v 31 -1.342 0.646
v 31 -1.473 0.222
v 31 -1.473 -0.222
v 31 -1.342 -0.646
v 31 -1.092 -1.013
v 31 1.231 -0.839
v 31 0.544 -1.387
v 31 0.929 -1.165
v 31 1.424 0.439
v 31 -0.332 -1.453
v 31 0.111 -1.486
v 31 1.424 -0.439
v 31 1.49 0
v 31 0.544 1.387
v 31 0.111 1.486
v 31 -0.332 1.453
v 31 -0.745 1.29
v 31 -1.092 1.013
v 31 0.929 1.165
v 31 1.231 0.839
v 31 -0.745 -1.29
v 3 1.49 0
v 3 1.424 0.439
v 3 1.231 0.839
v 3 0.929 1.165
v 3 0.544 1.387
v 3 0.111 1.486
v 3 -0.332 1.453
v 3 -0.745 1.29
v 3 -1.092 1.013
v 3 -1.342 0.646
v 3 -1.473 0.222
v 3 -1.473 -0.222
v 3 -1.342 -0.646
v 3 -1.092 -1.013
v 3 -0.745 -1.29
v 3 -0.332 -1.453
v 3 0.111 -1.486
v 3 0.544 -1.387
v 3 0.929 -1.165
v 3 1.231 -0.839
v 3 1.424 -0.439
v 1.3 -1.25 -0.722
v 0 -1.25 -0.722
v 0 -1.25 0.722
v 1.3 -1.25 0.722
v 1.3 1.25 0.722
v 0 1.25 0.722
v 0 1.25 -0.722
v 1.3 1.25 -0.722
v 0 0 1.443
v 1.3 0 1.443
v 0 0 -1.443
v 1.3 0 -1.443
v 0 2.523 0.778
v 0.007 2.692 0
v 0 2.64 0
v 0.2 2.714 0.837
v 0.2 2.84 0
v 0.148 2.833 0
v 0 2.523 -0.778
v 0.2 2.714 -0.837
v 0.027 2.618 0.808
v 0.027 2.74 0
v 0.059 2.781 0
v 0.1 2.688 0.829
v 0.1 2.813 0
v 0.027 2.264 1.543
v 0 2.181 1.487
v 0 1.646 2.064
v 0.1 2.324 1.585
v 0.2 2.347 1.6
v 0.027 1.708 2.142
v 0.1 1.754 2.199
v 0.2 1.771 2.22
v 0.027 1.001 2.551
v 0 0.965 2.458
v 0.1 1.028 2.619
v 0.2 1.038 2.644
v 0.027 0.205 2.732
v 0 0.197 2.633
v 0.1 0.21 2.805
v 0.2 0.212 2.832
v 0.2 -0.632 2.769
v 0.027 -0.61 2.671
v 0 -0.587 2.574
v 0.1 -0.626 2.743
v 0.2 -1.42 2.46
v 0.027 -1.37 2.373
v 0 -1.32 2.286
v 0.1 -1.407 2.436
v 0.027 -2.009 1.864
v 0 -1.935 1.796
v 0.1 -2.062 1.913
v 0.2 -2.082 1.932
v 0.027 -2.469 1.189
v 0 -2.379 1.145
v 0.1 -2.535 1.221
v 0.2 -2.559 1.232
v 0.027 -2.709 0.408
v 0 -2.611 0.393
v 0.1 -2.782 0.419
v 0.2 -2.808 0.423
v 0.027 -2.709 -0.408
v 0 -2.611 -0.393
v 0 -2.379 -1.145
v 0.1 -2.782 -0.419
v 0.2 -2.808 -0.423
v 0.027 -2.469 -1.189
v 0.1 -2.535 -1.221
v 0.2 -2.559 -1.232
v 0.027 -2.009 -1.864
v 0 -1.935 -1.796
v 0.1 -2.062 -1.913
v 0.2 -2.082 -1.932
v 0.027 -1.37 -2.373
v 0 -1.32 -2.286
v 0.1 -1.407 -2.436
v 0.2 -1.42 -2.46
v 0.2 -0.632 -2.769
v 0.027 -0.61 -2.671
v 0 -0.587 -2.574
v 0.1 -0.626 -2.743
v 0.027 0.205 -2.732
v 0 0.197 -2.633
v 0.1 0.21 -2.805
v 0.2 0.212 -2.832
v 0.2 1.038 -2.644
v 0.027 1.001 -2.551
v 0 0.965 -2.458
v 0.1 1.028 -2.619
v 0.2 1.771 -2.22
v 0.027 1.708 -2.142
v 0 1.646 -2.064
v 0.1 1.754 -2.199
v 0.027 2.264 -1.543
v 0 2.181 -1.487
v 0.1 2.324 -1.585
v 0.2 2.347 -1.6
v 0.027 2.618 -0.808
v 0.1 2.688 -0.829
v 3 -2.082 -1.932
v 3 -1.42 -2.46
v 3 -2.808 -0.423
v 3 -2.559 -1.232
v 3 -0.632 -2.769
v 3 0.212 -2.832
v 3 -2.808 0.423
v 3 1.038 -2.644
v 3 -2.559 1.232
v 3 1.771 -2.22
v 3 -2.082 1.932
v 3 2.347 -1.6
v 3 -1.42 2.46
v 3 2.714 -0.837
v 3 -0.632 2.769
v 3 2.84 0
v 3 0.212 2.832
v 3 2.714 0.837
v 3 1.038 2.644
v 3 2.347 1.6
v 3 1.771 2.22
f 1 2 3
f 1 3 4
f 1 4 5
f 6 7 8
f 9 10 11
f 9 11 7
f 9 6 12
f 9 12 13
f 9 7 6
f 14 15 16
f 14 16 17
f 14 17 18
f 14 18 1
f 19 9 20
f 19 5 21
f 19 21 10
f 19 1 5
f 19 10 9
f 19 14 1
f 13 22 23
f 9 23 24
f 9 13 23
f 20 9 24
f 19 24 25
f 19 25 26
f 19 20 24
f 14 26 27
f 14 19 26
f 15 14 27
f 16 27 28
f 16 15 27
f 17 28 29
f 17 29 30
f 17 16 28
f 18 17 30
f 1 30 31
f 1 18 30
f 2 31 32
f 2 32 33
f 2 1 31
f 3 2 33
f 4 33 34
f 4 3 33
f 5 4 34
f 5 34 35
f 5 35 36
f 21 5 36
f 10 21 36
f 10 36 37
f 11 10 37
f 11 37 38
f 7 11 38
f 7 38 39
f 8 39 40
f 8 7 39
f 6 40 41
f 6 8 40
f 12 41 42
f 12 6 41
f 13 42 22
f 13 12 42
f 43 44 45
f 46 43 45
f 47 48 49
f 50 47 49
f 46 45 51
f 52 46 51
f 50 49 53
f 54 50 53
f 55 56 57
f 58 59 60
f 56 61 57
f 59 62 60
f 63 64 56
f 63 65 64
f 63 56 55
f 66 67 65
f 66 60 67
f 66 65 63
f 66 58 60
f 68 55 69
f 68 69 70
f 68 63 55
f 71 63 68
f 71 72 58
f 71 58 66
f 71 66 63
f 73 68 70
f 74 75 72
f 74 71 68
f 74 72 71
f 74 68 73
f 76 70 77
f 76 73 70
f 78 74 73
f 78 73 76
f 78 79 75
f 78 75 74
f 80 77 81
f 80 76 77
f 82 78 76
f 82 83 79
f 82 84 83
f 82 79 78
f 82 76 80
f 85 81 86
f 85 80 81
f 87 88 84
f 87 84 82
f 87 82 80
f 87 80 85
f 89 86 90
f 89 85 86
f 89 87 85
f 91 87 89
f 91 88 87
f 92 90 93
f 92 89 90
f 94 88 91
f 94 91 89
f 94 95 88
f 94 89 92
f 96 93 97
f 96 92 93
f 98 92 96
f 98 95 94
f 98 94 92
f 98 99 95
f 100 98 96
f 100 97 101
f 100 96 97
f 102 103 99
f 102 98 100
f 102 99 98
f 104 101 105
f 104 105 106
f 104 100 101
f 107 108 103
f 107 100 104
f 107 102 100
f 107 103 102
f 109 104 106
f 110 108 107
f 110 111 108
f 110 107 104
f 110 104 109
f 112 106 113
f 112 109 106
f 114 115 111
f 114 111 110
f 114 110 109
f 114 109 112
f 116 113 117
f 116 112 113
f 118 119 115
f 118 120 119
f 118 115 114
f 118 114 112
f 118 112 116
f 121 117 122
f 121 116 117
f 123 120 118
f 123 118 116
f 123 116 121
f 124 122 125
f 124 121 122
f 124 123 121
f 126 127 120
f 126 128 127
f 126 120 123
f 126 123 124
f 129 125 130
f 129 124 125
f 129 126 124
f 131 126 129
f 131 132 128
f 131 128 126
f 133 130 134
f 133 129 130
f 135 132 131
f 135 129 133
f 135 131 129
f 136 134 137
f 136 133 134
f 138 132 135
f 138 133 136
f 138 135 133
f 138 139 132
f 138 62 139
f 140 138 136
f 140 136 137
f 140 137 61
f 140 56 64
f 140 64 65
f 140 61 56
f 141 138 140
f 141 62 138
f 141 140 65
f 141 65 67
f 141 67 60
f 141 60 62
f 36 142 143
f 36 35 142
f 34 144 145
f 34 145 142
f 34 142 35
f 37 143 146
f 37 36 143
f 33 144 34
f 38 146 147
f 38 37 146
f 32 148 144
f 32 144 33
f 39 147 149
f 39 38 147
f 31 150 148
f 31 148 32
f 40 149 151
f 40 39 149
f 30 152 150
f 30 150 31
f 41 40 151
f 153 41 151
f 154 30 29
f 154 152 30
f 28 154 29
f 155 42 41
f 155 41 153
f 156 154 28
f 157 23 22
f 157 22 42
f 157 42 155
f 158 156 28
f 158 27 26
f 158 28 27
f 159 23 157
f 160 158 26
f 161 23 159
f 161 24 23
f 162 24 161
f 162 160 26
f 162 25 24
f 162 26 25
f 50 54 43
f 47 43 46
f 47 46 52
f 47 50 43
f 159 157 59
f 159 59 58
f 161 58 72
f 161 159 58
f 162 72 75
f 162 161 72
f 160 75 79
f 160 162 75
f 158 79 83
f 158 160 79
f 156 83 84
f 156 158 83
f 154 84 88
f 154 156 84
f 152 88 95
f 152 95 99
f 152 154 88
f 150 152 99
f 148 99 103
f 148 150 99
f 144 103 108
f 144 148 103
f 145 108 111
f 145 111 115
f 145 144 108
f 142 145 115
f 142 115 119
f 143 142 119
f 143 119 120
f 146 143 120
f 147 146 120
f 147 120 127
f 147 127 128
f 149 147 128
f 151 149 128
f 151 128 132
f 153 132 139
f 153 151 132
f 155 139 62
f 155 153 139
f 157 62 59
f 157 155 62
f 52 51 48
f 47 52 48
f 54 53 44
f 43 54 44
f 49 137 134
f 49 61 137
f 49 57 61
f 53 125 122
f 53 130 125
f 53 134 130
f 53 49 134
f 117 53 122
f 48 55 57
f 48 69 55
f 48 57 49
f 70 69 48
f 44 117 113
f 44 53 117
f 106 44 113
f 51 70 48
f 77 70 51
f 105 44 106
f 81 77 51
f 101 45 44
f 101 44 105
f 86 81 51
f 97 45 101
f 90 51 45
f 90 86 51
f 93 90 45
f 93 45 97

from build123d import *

# Parameters (mm, degrees)
CUT_EXTRUDE_1_DEPTH = 1.3
FILLET_1_R          = 0.2


with BuildPart() as part:
    # 草图1 → 旋转1 (revolve)
    with BuildSketch(Plane.XY):
        Polygon((0, 0), (0, 2.84), (3, 2.84), (3, 1.49), (31, 1.49), (31, 0), align=None)
    revolve(axis=Axis((0, 0, 0), (1, 0, 0)))

    # 草图2 → 切除-拉伸1 (cut)
    with BuildSketch(Plane.ZY):
        Polygon((-1.443375673, 0), (-0.721687836, -1.25), (0.721687836, -1.25), (1.443375673, 0), (0.721687836, 1.25), (-0.721687836, 1.25), align=None)
    extrude(amount=-CUT_EXTRUDE_1_DEPTH, mode=Mode.SUBTRACT)

    # 圆角1
    fillet_1_edges = [part.edges().sort_by_distance(p)[0] for p in [
        (0, -2.84, 0),
    ]]
    fillet(fillet_1_edges, radius=FILLET_1_R)


solid = part.part
